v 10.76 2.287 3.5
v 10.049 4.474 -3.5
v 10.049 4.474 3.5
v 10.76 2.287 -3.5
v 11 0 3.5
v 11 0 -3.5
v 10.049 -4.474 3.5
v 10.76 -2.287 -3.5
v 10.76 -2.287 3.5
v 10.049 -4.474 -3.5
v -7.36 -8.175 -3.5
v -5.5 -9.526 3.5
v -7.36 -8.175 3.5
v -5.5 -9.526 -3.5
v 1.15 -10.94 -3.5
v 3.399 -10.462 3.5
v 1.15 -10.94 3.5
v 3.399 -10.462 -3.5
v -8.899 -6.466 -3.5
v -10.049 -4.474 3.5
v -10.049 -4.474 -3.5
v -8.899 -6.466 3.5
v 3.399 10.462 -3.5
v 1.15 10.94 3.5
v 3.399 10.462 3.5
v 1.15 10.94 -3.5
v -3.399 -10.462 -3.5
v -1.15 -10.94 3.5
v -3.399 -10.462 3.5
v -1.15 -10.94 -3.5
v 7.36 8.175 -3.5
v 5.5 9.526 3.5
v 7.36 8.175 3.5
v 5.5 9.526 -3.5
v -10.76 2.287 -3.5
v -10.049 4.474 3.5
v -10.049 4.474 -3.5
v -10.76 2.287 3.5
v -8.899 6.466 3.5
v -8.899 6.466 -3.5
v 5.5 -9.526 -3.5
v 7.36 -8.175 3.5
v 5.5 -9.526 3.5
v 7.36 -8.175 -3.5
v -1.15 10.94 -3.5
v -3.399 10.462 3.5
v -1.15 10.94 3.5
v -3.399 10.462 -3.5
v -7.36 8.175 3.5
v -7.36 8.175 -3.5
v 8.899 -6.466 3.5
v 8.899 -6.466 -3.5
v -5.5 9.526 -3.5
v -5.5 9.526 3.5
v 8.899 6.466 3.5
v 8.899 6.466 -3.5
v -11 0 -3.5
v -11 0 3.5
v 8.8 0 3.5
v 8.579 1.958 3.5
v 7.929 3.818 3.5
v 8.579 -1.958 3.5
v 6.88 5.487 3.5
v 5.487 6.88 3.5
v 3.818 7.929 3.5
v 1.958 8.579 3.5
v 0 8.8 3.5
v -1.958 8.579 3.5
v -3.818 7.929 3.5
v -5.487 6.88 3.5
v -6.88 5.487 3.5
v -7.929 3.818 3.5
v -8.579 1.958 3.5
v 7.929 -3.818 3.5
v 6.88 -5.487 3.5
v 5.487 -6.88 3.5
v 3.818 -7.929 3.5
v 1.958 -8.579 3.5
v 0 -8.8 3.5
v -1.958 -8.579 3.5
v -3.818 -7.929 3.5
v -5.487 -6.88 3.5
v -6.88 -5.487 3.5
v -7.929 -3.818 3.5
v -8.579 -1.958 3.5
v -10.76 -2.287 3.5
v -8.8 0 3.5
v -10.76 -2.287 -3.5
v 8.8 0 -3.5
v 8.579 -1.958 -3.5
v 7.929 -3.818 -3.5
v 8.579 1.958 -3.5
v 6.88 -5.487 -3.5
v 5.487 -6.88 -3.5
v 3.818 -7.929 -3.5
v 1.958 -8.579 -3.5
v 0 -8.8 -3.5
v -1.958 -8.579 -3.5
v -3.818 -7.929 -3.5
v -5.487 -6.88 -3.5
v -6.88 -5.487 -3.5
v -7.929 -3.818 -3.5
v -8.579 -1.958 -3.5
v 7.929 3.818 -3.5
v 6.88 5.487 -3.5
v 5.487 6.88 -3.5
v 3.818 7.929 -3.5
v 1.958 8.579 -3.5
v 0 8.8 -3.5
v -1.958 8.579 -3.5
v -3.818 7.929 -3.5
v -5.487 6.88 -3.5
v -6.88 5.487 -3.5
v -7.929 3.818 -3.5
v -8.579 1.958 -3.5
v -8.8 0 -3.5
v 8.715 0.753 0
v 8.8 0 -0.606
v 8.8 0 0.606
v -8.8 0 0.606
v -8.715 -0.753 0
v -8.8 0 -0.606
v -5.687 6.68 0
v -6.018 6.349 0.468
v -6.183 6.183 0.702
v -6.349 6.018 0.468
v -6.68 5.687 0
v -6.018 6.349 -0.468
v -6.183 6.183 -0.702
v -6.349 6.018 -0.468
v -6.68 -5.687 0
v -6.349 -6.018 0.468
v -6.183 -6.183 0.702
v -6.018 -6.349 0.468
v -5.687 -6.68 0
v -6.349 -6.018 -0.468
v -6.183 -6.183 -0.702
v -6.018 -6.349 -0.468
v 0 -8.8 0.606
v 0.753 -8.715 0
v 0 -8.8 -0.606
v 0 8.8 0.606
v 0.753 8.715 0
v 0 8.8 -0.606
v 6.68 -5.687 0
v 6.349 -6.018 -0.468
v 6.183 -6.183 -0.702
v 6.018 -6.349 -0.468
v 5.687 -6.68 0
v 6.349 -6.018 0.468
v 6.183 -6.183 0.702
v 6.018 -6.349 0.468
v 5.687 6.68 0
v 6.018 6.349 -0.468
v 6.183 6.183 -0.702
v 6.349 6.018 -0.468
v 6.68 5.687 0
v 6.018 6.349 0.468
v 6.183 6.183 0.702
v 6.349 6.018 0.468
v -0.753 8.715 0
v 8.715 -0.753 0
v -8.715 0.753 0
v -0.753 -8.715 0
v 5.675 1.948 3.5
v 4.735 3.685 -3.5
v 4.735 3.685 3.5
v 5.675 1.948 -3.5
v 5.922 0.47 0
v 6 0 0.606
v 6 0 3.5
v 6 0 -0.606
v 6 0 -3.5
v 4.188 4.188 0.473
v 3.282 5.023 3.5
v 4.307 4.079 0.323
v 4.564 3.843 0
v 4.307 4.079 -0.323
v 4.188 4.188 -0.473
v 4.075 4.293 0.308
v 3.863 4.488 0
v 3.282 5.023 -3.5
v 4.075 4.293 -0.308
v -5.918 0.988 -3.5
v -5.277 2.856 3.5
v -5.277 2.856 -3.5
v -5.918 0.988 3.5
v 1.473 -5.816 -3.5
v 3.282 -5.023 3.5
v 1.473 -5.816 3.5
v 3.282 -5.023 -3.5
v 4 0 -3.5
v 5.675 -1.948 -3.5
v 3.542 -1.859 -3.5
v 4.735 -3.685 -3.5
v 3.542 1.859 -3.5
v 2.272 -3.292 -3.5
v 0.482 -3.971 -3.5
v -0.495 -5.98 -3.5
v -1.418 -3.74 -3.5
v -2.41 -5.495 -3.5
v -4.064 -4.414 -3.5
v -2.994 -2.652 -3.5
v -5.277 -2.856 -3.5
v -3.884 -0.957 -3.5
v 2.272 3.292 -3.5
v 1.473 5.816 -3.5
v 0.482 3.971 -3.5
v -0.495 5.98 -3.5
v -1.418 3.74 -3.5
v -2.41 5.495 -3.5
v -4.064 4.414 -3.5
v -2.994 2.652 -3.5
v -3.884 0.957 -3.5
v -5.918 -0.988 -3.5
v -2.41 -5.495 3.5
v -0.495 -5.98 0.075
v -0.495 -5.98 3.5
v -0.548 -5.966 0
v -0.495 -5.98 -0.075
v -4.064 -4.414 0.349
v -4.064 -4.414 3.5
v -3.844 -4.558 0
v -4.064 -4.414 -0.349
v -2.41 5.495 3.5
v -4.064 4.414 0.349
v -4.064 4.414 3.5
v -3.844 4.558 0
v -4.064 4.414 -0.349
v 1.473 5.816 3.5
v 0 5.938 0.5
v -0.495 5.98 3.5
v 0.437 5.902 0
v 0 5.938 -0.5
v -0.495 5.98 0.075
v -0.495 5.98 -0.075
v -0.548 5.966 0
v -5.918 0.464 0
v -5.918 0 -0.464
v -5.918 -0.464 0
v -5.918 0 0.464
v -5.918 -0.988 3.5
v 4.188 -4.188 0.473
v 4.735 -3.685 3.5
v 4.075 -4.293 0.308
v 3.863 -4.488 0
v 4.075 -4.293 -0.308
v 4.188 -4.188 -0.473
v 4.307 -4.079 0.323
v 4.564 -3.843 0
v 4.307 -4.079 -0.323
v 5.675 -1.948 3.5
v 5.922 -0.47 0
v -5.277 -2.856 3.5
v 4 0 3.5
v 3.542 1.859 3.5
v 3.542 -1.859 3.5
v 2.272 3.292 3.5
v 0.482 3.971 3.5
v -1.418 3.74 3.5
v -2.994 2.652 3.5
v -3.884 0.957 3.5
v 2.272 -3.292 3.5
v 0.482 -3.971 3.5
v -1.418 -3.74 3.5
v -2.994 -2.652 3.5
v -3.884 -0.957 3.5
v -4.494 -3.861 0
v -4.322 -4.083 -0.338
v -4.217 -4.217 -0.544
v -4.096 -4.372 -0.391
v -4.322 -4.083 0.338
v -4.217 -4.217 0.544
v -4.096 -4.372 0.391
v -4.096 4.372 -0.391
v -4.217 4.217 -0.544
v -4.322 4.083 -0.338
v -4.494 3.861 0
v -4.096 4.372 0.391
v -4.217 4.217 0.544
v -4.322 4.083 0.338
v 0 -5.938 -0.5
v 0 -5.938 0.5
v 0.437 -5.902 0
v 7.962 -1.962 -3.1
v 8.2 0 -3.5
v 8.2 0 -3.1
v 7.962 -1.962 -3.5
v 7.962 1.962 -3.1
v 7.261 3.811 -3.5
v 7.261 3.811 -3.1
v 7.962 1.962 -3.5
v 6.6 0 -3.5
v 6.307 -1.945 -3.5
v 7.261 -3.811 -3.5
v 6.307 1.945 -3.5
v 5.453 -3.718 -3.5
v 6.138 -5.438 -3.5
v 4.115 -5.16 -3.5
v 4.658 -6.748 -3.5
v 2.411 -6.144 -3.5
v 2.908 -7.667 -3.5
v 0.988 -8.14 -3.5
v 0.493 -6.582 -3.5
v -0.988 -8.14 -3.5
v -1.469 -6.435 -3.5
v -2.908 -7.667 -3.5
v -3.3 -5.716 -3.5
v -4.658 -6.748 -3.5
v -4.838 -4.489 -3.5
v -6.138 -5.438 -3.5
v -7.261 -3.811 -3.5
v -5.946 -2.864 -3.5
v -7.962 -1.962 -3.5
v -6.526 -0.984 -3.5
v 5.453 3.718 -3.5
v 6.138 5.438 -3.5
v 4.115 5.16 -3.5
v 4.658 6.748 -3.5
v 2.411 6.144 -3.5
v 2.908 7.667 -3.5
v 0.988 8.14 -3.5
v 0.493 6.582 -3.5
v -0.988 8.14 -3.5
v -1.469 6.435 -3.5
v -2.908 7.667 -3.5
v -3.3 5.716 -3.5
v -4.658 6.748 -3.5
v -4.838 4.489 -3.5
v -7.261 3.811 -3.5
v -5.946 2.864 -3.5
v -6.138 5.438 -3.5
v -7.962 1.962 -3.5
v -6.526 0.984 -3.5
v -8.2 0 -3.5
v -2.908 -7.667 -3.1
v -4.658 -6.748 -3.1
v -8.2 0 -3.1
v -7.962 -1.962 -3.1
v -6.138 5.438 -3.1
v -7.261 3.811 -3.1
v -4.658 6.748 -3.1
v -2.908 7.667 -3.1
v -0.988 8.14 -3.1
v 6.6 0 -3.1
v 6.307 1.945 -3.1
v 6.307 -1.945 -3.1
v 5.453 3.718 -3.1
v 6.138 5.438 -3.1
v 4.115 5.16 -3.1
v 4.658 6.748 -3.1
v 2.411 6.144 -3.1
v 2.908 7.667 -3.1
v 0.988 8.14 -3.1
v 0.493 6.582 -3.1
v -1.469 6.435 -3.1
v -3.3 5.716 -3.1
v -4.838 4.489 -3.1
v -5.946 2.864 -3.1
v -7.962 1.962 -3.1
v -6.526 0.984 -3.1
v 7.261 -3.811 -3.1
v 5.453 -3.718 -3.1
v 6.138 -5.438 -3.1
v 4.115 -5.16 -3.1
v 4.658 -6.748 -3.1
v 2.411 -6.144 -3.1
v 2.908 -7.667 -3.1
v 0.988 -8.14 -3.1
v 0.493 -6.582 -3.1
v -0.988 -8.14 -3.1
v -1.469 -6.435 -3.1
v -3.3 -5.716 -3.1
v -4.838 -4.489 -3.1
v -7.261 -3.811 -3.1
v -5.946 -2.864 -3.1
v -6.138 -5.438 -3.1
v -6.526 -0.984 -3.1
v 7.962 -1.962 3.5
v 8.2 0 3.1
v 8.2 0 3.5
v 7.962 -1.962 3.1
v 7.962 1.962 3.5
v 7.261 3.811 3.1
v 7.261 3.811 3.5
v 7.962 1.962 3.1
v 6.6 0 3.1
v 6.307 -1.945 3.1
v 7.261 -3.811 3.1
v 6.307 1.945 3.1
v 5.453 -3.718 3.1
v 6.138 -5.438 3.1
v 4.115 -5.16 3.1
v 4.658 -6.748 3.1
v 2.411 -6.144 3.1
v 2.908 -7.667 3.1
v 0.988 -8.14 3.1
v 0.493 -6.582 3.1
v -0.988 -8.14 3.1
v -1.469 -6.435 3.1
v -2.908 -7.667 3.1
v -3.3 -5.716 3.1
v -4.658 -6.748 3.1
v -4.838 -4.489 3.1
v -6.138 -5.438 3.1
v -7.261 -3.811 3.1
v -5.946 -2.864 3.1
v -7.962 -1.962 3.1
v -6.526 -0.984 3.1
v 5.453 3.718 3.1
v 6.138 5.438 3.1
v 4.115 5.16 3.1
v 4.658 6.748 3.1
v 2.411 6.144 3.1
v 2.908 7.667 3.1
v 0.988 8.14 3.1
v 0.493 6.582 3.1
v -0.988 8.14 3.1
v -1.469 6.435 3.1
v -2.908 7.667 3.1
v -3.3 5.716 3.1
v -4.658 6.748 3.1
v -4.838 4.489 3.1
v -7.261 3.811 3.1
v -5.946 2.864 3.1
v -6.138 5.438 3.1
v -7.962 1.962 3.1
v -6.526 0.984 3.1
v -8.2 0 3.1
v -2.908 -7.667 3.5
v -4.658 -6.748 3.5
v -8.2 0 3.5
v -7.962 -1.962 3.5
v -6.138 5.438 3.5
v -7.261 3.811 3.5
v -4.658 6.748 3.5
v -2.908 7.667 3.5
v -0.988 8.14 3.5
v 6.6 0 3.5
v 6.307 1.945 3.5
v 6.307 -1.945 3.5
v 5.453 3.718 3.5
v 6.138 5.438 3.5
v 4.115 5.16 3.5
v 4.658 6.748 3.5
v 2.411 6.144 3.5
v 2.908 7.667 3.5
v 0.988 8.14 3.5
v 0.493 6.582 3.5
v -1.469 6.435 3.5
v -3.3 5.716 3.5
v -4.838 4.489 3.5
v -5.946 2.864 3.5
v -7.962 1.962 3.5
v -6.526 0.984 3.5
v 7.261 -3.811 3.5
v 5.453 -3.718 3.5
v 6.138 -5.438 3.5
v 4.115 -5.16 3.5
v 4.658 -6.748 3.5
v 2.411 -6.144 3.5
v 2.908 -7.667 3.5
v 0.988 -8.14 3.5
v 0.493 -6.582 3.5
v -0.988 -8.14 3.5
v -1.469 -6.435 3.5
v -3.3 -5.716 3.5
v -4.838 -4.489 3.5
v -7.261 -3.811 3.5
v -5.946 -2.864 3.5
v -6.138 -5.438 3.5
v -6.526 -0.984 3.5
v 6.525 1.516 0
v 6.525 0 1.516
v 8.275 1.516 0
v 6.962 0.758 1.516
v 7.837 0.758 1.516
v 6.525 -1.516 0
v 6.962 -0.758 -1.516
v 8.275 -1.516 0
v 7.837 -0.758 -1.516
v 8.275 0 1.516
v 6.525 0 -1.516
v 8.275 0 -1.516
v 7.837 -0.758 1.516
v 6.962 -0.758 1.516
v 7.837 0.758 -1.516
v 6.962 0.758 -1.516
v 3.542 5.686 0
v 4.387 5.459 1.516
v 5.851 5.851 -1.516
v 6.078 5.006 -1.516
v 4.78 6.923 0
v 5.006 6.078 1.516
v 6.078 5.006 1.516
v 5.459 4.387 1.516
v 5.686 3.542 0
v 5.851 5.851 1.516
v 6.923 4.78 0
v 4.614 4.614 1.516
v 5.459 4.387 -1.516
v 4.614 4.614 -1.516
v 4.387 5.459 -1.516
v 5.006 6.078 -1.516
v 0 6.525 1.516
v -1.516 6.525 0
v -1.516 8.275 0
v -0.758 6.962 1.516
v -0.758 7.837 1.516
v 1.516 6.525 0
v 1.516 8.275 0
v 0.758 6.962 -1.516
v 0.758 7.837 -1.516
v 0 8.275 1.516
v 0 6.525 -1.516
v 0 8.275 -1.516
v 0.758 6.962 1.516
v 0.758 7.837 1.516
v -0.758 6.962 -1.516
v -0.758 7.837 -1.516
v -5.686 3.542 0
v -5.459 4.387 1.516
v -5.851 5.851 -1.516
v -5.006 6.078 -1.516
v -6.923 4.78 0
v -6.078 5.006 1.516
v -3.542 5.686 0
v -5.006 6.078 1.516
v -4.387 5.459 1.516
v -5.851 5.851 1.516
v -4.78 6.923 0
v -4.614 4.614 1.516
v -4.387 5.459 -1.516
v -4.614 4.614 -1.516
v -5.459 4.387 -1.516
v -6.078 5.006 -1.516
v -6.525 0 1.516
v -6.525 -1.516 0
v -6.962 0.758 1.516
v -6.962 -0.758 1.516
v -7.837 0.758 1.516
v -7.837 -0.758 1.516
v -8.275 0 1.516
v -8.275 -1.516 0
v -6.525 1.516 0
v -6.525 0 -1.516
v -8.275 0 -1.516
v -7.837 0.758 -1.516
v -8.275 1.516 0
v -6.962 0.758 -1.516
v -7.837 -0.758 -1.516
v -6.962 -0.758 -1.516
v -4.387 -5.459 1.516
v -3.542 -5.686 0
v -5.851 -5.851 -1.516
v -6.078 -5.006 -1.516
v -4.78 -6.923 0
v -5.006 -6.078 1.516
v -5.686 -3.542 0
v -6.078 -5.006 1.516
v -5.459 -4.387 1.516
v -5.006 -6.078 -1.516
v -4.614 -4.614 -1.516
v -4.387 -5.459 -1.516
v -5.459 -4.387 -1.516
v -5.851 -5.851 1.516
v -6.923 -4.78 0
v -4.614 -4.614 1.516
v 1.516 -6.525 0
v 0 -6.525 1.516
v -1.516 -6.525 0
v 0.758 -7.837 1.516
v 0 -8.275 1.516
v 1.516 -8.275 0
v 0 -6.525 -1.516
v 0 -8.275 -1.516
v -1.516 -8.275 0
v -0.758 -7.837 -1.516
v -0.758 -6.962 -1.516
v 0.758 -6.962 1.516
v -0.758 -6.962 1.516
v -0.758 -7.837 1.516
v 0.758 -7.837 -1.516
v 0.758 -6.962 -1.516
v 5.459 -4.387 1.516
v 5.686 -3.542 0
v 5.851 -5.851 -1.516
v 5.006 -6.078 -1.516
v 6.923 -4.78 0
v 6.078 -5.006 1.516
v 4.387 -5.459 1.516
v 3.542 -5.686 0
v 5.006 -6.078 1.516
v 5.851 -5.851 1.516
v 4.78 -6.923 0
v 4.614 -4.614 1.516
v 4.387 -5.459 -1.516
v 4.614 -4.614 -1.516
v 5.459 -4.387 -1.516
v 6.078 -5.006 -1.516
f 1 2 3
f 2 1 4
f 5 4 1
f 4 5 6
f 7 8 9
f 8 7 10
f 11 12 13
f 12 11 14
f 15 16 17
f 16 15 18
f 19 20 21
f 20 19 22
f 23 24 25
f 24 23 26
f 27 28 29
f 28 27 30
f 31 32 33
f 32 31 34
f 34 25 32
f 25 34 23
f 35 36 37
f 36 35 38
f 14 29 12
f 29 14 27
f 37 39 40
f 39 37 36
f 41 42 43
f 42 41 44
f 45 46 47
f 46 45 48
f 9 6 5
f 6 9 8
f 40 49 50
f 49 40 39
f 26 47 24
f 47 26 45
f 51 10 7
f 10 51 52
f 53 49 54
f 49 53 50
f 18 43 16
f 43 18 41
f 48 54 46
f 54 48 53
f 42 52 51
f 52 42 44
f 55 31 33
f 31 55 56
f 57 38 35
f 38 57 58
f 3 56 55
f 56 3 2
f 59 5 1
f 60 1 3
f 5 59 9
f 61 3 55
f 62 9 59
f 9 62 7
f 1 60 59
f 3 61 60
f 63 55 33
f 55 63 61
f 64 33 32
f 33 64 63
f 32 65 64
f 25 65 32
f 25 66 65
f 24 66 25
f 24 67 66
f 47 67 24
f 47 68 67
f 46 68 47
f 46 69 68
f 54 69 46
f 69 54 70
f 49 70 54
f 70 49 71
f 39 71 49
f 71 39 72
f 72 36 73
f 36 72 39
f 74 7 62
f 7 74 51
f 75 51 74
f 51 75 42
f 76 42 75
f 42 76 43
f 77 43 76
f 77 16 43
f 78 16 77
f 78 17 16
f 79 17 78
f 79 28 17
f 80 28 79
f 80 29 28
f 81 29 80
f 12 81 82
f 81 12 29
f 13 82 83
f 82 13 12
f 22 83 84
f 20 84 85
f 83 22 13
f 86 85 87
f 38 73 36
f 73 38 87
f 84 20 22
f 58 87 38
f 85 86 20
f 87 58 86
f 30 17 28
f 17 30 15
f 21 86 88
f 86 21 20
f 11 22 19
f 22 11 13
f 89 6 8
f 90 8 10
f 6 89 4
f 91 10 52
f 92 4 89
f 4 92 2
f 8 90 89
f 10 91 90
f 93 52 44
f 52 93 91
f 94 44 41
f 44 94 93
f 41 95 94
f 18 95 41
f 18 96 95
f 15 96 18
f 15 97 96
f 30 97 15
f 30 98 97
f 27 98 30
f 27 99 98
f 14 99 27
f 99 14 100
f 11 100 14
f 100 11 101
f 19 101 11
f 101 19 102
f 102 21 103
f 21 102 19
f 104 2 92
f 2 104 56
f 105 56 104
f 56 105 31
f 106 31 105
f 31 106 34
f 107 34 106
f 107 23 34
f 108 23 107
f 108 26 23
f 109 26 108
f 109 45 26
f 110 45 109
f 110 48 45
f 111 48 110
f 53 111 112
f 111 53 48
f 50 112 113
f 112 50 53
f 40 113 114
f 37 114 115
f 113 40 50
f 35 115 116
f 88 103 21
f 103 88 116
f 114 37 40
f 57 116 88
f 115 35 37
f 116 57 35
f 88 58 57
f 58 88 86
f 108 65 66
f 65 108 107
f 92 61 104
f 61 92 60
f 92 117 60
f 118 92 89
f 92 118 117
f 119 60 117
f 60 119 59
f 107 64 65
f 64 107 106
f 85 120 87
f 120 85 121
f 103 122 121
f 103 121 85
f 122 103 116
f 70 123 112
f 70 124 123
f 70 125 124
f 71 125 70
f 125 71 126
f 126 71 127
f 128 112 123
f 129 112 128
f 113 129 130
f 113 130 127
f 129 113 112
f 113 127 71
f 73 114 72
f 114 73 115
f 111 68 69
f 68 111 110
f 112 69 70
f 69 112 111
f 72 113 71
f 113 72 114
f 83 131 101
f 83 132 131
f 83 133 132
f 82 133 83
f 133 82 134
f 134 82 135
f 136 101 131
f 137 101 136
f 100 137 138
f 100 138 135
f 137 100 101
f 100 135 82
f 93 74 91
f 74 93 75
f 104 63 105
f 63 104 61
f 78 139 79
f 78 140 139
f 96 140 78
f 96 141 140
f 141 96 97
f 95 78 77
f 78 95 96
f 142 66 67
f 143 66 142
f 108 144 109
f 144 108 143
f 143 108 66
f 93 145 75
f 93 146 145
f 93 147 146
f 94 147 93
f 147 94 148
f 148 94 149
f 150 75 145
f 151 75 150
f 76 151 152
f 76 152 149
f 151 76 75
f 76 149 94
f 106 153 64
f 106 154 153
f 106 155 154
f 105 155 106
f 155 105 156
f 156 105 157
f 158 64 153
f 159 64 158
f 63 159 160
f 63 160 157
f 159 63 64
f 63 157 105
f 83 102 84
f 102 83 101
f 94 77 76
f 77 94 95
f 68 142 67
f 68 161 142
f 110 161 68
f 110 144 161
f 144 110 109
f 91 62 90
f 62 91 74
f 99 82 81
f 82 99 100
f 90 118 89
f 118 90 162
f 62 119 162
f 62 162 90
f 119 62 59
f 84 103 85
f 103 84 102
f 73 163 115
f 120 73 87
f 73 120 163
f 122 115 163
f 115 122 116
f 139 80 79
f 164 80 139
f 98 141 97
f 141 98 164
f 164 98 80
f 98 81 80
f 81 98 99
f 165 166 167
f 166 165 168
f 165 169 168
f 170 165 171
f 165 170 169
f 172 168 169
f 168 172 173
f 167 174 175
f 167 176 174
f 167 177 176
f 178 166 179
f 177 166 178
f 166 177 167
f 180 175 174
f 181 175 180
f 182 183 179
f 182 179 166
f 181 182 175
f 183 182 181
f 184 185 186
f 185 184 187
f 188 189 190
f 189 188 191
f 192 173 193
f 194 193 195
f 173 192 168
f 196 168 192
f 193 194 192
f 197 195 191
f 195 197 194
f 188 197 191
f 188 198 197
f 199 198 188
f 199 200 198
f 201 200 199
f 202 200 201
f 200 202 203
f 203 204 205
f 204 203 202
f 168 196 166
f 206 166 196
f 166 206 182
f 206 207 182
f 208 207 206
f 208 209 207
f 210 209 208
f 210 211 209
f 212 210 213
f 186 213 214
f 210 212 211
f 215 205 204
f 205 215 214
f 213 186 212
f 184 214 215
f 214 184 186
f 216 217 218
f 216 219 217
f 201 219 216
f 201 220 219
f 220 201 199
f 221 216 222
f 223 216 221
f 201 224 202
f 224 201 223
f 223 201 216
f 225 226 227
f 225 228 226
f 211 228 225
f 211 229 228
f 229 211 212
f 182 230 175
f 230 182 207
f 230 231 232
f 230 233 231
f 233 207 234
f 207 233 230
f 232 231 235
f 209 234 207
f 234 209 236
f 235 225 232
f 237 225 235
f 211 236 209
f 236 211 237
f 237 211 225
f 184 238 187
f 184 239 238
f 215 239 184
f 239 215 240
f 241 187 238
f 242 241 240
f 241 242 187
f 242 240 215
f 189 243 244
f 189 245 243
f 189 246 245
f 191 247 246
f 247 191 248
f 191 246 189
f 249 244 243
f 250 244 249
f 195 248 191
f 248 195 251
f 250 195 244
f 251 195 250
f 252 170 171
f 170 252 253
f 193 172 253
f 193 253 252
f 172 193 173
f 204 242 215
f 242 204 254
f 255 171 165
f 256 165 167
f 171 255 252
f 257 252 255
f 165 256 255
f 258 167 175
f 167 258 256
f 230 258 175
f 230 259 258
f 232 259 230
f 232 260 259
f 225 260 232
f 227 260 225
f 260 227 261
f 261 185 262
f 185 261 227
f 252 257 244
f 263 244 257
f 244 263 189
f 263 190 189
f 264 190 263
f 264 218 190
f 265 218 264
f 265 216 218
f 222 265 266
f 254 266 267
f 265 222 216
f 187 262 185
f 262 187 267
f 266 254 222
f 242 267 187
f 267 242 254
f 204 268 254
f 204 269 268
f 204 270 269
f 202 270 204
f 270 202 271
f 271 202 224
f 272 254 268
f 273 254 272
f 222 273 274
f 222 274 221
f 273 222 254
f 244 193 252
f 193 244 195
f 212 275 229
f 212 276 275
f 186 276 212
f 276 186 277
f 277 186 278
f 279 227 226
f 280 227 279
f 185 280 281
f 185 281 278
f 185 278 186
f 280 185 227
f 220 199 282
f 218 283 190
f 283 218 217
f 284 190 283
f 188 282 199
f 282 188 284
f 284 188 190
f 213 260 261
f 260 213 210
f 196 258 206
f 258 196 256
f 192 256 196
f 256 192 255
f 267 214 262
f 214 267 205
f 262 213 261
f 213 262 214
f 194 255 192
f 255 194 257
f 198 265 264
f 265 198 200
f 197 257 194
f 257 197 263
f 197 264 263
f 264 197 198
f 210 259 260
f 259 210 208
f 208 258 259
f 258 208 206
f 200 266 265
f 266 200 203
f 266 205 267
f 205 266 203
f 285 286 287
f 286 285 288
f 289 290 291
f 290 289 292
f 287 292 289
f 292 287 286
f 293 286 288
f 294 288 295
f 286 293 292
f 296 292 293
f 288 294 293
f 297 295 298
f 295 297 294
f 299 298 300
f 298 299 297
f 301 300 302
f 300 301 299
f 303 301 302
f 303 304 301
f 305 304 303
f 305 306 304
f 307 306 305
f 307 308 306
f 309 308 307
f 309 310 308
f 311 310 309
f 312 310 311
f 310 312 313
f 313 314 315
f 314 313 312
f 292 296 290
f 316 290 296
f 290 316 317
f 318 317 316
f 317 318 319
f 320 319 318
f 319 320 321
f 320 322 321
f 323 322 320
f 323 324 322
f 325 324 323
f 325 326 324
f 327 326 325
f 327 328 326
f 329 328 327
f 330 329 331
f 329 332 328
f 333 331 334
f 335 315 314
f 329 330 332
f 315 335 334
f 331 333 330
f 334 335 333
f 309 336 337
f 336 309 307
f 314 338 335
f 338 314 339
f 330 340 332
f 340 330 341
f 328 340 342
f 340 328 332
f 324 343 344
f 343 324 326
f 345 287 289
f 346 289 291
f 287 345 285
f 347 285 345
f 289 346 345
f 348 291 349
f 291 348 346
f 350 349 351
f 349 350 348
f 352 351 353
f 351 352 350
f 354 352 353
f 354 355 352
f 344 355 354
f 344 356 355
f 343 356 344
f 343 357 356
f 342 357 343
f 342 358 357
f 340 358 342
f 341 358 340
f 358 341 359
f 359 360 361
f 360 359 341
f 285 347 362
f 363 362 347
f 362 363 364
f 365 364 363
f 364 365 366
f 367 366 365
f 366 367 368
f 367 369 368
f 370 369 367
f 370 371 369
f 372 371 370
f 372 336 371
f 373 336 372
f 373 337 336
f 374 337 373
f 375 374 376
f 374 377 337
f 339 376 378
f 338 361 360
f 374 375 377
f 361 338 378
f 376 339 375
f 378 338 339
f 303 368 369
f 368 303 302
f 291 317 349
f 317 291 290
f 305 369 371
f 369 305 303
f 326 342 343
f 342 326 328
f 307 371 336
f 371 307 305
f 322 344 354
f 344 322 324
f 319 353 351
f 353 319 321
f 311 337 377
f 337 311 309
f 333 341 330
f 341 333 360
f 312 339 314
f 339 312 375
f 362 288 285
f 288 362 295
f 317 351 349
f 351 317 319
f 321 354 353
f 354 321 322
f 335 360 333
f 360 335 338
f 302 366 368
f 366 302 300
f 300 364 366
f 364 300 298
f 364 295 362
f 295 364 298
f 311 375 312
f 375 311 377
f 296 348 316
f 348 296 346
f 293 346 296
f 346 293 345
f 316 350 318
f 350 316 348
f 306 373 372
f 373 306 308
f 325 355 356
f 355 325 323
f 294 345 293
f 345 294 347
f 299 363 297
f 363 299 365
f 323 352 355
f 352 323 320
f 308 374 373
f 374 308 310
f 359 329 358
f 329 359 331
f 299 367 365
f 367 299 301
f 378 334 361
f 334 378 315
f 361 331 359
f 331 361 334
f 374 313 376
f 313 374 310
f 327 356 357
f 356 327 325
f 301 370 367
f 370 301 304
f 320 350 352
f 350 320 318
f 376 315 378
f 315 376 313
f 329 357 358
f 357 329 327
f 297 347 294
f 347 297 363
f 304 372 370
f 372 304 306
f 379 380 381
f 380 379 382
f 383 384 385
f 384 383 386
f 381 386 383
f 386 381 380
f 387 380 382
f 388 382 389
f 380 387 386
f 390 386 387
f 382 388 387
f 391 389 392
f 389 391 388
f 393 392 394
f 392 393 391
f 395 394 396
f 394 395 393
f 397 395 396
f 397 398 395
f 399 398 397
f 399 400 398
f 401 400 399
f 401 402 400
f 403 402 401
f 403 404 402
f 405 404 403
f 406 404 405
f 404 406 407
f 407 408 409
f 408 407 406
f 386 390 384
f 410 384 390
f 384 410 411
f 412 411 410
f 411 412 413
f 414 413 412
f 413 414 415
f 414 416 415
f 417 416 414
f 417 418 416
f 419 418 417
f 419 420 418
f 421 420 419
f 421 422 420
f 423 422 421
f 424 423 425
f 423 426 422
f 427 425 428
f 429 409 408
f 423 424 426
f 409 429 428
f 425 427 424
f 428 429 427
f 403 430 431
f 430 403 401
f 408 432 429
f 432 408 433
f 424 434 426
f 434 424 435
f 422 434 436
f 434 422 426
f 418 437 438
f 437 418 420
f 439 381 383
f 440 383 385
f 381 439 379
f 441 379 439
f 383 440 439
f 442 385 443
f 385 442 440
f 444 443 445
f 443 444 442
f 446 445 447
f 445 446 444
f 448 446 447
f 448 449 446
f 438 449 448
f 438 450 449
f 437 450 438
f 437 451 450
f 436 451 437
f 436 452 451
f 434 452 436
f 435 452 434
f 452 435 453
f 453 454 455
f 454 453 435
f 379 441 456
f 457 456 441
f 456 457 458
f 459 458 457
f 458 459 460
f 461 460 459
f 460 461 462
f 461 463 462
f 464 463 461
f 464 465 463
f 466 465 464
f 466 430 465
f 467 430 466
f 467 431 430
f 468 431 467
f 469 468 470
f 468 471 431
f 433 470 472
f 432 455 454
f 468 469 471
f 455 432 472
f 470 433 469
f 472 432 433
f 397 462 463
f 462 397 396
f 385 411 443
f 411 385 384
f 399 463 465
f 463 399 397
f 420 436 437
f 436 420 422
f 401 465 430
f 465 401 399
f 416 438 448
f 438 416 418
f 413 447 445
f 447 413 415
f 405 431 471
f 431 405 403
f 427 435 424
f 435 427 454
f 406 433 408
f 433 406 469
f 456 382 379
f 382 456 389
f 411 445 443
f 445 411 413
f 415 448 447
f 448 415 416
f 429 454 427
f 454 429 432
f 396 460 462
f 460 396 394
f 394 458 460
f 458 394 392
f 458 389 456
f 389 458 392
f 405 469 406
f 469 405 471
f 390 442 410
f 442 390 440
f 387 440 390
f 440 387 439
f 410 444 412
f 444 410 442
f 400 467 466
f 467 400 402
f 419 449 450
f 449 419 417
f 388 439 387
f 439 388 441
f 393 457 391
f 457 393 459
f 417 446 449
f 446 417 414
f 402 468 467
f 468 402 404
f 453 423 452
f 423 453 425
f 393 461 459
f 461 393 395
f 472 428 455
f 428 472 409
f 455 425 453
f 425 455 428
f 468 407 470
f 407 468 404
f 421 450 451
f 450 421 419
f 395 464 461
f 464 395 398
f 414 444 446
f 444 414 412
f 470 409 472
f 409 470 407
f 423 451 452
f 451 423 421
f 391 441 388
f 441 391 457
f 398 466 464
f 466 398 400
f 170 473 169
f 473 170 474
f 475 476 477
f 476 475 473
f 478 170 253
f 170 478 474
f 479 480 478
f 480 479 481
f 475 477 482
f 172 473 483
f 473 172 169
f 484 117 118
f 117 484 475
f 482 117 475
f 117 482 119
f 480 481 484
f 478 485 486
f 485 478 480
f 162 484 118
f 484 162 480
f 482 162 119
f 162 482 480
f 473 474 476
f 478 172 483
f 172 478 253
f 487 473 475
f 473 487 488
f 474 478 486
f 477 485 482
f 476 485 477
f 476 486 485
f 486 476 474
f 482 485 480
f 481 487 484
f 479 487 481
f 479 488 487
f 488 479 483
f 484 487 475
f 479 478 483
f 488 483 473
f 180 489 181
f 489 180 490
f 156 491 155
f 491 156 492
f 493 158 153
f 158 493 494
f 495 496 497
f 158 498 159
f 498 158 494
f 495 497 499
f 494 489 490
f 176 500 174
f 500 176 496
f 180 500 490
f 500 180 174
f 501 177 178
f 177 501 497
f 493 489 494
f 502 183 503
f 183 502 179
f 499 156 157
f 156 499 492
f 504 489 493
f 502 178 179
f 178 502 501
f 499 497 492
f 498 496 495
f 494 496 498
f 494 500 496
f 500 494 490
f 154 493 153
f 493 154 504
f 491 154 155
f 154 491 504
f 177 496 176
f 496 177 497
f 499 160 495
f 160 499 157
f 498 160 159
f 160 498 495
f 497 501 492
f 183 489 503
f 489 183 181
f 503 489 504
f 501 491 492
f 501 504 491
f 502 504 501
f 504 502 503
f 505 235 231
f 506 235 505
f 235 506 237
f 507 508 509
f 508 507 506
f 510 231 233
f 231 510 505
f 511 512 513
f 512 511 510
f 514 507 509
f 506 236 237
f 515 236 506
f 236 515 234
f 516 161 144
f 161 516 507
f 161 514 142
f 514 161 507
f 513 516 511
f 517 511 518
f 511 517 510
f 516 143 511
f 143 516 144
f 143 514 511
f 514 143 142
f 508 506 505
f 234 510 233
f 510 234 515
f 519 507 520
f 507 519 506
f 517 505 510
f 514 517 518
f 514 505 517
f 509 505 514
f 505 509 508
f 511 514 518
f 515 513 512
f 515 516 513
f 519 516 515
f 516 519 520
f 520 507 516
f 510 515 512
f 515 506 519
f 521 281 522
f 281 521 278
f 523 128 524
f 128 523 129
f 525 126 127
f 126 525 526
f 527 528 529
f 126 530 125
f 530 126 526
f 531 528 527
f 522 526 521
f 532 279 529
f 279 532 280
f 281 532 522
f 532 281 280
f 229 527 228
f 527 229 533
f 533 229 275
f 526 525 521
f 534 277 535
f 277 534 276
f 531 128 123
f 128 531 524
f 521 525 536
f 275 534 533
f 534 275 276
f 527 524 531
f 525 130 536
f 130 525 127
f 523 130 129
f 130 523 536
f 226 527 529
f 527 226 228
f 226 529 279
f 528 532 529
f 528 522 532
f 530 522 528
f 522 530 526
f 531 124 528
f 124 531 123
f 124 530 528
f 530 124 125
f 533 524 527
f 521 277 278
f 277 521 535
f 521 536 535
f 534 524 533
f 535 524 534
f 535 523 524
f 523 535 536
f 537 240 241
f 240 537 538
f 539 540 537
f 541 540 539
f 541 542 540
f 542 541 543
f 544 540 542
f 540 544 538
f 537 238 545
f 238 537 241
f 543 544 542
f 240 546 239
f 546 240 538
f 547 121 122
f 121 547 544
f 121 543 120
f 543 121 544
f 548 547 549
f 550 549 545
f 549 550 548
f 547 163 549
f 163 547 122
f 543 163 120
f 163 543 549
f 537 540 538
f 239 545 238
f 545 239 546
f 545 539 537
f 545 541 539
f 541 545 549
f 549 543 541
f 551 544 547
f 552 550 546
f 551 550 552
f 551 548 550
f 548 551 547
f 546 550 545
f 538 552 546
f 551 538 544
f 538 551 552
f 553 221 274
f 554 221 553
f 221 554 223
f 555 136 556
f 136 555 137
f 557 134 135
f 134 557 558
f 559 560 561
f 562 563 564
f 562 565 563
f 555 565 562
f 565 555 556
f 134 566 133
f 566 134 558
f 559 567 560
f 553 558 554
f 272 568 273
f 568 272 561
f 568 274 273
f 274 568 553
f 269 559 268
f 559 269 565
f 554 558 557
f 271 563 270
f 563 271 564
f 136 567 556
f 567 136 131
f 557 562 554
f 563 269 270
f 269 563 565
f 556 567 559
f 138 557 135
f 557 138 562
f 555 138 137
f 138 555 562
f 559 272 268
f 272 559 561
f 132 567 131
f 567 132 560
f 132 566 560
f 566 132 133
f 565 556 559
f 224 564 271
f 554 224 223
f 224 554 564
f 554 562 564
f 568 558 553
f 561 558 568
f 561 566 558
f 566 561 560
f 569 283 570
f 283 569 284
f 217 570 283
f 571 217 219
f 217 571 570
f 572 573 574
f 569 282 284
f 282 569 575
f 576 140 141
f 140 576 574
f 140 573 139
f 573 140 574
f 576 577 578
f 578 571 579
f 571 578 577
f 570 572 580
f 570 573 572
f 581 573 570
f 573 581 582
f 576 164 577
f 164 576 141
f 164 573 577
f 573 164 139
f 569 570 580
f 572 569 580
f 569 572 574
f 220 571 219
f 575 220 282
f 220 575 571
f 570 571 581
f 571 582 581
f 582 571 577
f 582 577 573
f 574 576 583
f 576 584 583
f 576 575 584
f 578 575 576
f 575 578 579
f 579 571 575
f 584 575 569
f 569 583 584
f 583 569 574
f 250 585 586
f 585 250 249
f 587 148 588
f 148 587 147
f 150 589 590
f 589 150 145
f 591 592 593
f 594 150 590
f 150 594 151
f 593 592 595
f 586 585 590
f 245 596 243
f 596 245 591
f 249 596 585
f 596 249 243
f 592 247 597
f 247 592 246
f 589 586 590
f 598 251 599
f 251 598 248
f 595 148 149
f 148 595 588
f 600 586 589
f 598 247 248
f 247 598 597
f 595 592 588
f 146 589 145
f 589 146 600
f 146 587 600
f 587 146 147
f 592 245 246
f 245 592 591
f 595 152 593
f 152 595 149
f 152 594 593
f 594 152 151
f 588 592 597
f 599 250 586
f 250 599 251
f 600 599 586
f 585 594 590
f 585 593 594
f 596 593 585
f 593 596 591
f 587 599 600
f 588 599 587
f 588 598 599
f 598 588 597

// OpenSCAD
// Parameters
bore_diameter_mm = 8; //[4:16:0.1]
outer_diameter_mm = 22; //[11:44:0.1]
width_mm = 7; //[3.5:14:0.1]
radial_rim_thickness_mm = 2.2; //[1.2:4.4:0.1]
radial_hub_thickness_mm = 2.0; //[1.0:4.0:0.1]
ball_diameter_mm = 3.5; //[2:6:0.1]
ball_count = 8; //[6:12:1]
shield_thickness_mm = 0.4; //[0.2:1.0:0.05]
shield_radial_clearance_mm = 0.6; //[0.2:1.5:0.05]
axial_internal_clearance_mm = 0.8; //[0.4:1.6:0.05]
overlap_mm = 0.8; //[0.3:2.0:0.1]

// Ball Bearing - complete geometry
module ball_bearing() {
  color("Silver") {
    // Outer Race
    difference() {
      cylinder(r=outer_diameter_mm/2, h=width_mm, center=true);
      cylinder(r=outer_diameter_mm/2 - radial_rim_thickness_mm, h=width_mm + 2*overlap_mm, center=true);
    }
    // Inner Race
    difference() {
      cylinder(r=bore_diameter_mm/2 + radial_hub_thickness_mm, h=width_mm, center=true);
      cylinder(r=bore_diameter_mm/2, h=width_mm + 2*overlap_mm, center=true);
    }
    // Shields
    for (z = [-1, 1]) {
      translate([0, 0, z * (width_mm/2 - shield_thickness_mm/2)])
        difference() {
          cylinder(r=outer_diameter_mm/2 - radial_rim_thickness_mm - shield_radial_clearance_mm, h=shield_thickness_mm, center=true);
          cylinder(r=bore_diameter_mm/2 + radial_hub_thickness_mm + shield_radial_clearance_mm, h=shield_thickness_mm + 2*overlap_mm, center=true);
        }
    }
  }
}

// Bearing Ball - complete geometry
module bearing_ball() {
  color("DimGray") {
    sphere(r=ball_diameter_mm/2);
  }
}

// Assembly
module assembly() {
  ball_bearing();
  // Ball Set
  for (i = [0:ball_count-1]) {
    rotate([0, 0, i * 360/ball_count])
      translate([(bore_diameter_mm/2 + radial_hub_thickness_mm + (outer_diameter_mm/2 - radial_rim_thickness_mm))/2, 0, 0])
        bearing_ball();
  }
}

assembly();
